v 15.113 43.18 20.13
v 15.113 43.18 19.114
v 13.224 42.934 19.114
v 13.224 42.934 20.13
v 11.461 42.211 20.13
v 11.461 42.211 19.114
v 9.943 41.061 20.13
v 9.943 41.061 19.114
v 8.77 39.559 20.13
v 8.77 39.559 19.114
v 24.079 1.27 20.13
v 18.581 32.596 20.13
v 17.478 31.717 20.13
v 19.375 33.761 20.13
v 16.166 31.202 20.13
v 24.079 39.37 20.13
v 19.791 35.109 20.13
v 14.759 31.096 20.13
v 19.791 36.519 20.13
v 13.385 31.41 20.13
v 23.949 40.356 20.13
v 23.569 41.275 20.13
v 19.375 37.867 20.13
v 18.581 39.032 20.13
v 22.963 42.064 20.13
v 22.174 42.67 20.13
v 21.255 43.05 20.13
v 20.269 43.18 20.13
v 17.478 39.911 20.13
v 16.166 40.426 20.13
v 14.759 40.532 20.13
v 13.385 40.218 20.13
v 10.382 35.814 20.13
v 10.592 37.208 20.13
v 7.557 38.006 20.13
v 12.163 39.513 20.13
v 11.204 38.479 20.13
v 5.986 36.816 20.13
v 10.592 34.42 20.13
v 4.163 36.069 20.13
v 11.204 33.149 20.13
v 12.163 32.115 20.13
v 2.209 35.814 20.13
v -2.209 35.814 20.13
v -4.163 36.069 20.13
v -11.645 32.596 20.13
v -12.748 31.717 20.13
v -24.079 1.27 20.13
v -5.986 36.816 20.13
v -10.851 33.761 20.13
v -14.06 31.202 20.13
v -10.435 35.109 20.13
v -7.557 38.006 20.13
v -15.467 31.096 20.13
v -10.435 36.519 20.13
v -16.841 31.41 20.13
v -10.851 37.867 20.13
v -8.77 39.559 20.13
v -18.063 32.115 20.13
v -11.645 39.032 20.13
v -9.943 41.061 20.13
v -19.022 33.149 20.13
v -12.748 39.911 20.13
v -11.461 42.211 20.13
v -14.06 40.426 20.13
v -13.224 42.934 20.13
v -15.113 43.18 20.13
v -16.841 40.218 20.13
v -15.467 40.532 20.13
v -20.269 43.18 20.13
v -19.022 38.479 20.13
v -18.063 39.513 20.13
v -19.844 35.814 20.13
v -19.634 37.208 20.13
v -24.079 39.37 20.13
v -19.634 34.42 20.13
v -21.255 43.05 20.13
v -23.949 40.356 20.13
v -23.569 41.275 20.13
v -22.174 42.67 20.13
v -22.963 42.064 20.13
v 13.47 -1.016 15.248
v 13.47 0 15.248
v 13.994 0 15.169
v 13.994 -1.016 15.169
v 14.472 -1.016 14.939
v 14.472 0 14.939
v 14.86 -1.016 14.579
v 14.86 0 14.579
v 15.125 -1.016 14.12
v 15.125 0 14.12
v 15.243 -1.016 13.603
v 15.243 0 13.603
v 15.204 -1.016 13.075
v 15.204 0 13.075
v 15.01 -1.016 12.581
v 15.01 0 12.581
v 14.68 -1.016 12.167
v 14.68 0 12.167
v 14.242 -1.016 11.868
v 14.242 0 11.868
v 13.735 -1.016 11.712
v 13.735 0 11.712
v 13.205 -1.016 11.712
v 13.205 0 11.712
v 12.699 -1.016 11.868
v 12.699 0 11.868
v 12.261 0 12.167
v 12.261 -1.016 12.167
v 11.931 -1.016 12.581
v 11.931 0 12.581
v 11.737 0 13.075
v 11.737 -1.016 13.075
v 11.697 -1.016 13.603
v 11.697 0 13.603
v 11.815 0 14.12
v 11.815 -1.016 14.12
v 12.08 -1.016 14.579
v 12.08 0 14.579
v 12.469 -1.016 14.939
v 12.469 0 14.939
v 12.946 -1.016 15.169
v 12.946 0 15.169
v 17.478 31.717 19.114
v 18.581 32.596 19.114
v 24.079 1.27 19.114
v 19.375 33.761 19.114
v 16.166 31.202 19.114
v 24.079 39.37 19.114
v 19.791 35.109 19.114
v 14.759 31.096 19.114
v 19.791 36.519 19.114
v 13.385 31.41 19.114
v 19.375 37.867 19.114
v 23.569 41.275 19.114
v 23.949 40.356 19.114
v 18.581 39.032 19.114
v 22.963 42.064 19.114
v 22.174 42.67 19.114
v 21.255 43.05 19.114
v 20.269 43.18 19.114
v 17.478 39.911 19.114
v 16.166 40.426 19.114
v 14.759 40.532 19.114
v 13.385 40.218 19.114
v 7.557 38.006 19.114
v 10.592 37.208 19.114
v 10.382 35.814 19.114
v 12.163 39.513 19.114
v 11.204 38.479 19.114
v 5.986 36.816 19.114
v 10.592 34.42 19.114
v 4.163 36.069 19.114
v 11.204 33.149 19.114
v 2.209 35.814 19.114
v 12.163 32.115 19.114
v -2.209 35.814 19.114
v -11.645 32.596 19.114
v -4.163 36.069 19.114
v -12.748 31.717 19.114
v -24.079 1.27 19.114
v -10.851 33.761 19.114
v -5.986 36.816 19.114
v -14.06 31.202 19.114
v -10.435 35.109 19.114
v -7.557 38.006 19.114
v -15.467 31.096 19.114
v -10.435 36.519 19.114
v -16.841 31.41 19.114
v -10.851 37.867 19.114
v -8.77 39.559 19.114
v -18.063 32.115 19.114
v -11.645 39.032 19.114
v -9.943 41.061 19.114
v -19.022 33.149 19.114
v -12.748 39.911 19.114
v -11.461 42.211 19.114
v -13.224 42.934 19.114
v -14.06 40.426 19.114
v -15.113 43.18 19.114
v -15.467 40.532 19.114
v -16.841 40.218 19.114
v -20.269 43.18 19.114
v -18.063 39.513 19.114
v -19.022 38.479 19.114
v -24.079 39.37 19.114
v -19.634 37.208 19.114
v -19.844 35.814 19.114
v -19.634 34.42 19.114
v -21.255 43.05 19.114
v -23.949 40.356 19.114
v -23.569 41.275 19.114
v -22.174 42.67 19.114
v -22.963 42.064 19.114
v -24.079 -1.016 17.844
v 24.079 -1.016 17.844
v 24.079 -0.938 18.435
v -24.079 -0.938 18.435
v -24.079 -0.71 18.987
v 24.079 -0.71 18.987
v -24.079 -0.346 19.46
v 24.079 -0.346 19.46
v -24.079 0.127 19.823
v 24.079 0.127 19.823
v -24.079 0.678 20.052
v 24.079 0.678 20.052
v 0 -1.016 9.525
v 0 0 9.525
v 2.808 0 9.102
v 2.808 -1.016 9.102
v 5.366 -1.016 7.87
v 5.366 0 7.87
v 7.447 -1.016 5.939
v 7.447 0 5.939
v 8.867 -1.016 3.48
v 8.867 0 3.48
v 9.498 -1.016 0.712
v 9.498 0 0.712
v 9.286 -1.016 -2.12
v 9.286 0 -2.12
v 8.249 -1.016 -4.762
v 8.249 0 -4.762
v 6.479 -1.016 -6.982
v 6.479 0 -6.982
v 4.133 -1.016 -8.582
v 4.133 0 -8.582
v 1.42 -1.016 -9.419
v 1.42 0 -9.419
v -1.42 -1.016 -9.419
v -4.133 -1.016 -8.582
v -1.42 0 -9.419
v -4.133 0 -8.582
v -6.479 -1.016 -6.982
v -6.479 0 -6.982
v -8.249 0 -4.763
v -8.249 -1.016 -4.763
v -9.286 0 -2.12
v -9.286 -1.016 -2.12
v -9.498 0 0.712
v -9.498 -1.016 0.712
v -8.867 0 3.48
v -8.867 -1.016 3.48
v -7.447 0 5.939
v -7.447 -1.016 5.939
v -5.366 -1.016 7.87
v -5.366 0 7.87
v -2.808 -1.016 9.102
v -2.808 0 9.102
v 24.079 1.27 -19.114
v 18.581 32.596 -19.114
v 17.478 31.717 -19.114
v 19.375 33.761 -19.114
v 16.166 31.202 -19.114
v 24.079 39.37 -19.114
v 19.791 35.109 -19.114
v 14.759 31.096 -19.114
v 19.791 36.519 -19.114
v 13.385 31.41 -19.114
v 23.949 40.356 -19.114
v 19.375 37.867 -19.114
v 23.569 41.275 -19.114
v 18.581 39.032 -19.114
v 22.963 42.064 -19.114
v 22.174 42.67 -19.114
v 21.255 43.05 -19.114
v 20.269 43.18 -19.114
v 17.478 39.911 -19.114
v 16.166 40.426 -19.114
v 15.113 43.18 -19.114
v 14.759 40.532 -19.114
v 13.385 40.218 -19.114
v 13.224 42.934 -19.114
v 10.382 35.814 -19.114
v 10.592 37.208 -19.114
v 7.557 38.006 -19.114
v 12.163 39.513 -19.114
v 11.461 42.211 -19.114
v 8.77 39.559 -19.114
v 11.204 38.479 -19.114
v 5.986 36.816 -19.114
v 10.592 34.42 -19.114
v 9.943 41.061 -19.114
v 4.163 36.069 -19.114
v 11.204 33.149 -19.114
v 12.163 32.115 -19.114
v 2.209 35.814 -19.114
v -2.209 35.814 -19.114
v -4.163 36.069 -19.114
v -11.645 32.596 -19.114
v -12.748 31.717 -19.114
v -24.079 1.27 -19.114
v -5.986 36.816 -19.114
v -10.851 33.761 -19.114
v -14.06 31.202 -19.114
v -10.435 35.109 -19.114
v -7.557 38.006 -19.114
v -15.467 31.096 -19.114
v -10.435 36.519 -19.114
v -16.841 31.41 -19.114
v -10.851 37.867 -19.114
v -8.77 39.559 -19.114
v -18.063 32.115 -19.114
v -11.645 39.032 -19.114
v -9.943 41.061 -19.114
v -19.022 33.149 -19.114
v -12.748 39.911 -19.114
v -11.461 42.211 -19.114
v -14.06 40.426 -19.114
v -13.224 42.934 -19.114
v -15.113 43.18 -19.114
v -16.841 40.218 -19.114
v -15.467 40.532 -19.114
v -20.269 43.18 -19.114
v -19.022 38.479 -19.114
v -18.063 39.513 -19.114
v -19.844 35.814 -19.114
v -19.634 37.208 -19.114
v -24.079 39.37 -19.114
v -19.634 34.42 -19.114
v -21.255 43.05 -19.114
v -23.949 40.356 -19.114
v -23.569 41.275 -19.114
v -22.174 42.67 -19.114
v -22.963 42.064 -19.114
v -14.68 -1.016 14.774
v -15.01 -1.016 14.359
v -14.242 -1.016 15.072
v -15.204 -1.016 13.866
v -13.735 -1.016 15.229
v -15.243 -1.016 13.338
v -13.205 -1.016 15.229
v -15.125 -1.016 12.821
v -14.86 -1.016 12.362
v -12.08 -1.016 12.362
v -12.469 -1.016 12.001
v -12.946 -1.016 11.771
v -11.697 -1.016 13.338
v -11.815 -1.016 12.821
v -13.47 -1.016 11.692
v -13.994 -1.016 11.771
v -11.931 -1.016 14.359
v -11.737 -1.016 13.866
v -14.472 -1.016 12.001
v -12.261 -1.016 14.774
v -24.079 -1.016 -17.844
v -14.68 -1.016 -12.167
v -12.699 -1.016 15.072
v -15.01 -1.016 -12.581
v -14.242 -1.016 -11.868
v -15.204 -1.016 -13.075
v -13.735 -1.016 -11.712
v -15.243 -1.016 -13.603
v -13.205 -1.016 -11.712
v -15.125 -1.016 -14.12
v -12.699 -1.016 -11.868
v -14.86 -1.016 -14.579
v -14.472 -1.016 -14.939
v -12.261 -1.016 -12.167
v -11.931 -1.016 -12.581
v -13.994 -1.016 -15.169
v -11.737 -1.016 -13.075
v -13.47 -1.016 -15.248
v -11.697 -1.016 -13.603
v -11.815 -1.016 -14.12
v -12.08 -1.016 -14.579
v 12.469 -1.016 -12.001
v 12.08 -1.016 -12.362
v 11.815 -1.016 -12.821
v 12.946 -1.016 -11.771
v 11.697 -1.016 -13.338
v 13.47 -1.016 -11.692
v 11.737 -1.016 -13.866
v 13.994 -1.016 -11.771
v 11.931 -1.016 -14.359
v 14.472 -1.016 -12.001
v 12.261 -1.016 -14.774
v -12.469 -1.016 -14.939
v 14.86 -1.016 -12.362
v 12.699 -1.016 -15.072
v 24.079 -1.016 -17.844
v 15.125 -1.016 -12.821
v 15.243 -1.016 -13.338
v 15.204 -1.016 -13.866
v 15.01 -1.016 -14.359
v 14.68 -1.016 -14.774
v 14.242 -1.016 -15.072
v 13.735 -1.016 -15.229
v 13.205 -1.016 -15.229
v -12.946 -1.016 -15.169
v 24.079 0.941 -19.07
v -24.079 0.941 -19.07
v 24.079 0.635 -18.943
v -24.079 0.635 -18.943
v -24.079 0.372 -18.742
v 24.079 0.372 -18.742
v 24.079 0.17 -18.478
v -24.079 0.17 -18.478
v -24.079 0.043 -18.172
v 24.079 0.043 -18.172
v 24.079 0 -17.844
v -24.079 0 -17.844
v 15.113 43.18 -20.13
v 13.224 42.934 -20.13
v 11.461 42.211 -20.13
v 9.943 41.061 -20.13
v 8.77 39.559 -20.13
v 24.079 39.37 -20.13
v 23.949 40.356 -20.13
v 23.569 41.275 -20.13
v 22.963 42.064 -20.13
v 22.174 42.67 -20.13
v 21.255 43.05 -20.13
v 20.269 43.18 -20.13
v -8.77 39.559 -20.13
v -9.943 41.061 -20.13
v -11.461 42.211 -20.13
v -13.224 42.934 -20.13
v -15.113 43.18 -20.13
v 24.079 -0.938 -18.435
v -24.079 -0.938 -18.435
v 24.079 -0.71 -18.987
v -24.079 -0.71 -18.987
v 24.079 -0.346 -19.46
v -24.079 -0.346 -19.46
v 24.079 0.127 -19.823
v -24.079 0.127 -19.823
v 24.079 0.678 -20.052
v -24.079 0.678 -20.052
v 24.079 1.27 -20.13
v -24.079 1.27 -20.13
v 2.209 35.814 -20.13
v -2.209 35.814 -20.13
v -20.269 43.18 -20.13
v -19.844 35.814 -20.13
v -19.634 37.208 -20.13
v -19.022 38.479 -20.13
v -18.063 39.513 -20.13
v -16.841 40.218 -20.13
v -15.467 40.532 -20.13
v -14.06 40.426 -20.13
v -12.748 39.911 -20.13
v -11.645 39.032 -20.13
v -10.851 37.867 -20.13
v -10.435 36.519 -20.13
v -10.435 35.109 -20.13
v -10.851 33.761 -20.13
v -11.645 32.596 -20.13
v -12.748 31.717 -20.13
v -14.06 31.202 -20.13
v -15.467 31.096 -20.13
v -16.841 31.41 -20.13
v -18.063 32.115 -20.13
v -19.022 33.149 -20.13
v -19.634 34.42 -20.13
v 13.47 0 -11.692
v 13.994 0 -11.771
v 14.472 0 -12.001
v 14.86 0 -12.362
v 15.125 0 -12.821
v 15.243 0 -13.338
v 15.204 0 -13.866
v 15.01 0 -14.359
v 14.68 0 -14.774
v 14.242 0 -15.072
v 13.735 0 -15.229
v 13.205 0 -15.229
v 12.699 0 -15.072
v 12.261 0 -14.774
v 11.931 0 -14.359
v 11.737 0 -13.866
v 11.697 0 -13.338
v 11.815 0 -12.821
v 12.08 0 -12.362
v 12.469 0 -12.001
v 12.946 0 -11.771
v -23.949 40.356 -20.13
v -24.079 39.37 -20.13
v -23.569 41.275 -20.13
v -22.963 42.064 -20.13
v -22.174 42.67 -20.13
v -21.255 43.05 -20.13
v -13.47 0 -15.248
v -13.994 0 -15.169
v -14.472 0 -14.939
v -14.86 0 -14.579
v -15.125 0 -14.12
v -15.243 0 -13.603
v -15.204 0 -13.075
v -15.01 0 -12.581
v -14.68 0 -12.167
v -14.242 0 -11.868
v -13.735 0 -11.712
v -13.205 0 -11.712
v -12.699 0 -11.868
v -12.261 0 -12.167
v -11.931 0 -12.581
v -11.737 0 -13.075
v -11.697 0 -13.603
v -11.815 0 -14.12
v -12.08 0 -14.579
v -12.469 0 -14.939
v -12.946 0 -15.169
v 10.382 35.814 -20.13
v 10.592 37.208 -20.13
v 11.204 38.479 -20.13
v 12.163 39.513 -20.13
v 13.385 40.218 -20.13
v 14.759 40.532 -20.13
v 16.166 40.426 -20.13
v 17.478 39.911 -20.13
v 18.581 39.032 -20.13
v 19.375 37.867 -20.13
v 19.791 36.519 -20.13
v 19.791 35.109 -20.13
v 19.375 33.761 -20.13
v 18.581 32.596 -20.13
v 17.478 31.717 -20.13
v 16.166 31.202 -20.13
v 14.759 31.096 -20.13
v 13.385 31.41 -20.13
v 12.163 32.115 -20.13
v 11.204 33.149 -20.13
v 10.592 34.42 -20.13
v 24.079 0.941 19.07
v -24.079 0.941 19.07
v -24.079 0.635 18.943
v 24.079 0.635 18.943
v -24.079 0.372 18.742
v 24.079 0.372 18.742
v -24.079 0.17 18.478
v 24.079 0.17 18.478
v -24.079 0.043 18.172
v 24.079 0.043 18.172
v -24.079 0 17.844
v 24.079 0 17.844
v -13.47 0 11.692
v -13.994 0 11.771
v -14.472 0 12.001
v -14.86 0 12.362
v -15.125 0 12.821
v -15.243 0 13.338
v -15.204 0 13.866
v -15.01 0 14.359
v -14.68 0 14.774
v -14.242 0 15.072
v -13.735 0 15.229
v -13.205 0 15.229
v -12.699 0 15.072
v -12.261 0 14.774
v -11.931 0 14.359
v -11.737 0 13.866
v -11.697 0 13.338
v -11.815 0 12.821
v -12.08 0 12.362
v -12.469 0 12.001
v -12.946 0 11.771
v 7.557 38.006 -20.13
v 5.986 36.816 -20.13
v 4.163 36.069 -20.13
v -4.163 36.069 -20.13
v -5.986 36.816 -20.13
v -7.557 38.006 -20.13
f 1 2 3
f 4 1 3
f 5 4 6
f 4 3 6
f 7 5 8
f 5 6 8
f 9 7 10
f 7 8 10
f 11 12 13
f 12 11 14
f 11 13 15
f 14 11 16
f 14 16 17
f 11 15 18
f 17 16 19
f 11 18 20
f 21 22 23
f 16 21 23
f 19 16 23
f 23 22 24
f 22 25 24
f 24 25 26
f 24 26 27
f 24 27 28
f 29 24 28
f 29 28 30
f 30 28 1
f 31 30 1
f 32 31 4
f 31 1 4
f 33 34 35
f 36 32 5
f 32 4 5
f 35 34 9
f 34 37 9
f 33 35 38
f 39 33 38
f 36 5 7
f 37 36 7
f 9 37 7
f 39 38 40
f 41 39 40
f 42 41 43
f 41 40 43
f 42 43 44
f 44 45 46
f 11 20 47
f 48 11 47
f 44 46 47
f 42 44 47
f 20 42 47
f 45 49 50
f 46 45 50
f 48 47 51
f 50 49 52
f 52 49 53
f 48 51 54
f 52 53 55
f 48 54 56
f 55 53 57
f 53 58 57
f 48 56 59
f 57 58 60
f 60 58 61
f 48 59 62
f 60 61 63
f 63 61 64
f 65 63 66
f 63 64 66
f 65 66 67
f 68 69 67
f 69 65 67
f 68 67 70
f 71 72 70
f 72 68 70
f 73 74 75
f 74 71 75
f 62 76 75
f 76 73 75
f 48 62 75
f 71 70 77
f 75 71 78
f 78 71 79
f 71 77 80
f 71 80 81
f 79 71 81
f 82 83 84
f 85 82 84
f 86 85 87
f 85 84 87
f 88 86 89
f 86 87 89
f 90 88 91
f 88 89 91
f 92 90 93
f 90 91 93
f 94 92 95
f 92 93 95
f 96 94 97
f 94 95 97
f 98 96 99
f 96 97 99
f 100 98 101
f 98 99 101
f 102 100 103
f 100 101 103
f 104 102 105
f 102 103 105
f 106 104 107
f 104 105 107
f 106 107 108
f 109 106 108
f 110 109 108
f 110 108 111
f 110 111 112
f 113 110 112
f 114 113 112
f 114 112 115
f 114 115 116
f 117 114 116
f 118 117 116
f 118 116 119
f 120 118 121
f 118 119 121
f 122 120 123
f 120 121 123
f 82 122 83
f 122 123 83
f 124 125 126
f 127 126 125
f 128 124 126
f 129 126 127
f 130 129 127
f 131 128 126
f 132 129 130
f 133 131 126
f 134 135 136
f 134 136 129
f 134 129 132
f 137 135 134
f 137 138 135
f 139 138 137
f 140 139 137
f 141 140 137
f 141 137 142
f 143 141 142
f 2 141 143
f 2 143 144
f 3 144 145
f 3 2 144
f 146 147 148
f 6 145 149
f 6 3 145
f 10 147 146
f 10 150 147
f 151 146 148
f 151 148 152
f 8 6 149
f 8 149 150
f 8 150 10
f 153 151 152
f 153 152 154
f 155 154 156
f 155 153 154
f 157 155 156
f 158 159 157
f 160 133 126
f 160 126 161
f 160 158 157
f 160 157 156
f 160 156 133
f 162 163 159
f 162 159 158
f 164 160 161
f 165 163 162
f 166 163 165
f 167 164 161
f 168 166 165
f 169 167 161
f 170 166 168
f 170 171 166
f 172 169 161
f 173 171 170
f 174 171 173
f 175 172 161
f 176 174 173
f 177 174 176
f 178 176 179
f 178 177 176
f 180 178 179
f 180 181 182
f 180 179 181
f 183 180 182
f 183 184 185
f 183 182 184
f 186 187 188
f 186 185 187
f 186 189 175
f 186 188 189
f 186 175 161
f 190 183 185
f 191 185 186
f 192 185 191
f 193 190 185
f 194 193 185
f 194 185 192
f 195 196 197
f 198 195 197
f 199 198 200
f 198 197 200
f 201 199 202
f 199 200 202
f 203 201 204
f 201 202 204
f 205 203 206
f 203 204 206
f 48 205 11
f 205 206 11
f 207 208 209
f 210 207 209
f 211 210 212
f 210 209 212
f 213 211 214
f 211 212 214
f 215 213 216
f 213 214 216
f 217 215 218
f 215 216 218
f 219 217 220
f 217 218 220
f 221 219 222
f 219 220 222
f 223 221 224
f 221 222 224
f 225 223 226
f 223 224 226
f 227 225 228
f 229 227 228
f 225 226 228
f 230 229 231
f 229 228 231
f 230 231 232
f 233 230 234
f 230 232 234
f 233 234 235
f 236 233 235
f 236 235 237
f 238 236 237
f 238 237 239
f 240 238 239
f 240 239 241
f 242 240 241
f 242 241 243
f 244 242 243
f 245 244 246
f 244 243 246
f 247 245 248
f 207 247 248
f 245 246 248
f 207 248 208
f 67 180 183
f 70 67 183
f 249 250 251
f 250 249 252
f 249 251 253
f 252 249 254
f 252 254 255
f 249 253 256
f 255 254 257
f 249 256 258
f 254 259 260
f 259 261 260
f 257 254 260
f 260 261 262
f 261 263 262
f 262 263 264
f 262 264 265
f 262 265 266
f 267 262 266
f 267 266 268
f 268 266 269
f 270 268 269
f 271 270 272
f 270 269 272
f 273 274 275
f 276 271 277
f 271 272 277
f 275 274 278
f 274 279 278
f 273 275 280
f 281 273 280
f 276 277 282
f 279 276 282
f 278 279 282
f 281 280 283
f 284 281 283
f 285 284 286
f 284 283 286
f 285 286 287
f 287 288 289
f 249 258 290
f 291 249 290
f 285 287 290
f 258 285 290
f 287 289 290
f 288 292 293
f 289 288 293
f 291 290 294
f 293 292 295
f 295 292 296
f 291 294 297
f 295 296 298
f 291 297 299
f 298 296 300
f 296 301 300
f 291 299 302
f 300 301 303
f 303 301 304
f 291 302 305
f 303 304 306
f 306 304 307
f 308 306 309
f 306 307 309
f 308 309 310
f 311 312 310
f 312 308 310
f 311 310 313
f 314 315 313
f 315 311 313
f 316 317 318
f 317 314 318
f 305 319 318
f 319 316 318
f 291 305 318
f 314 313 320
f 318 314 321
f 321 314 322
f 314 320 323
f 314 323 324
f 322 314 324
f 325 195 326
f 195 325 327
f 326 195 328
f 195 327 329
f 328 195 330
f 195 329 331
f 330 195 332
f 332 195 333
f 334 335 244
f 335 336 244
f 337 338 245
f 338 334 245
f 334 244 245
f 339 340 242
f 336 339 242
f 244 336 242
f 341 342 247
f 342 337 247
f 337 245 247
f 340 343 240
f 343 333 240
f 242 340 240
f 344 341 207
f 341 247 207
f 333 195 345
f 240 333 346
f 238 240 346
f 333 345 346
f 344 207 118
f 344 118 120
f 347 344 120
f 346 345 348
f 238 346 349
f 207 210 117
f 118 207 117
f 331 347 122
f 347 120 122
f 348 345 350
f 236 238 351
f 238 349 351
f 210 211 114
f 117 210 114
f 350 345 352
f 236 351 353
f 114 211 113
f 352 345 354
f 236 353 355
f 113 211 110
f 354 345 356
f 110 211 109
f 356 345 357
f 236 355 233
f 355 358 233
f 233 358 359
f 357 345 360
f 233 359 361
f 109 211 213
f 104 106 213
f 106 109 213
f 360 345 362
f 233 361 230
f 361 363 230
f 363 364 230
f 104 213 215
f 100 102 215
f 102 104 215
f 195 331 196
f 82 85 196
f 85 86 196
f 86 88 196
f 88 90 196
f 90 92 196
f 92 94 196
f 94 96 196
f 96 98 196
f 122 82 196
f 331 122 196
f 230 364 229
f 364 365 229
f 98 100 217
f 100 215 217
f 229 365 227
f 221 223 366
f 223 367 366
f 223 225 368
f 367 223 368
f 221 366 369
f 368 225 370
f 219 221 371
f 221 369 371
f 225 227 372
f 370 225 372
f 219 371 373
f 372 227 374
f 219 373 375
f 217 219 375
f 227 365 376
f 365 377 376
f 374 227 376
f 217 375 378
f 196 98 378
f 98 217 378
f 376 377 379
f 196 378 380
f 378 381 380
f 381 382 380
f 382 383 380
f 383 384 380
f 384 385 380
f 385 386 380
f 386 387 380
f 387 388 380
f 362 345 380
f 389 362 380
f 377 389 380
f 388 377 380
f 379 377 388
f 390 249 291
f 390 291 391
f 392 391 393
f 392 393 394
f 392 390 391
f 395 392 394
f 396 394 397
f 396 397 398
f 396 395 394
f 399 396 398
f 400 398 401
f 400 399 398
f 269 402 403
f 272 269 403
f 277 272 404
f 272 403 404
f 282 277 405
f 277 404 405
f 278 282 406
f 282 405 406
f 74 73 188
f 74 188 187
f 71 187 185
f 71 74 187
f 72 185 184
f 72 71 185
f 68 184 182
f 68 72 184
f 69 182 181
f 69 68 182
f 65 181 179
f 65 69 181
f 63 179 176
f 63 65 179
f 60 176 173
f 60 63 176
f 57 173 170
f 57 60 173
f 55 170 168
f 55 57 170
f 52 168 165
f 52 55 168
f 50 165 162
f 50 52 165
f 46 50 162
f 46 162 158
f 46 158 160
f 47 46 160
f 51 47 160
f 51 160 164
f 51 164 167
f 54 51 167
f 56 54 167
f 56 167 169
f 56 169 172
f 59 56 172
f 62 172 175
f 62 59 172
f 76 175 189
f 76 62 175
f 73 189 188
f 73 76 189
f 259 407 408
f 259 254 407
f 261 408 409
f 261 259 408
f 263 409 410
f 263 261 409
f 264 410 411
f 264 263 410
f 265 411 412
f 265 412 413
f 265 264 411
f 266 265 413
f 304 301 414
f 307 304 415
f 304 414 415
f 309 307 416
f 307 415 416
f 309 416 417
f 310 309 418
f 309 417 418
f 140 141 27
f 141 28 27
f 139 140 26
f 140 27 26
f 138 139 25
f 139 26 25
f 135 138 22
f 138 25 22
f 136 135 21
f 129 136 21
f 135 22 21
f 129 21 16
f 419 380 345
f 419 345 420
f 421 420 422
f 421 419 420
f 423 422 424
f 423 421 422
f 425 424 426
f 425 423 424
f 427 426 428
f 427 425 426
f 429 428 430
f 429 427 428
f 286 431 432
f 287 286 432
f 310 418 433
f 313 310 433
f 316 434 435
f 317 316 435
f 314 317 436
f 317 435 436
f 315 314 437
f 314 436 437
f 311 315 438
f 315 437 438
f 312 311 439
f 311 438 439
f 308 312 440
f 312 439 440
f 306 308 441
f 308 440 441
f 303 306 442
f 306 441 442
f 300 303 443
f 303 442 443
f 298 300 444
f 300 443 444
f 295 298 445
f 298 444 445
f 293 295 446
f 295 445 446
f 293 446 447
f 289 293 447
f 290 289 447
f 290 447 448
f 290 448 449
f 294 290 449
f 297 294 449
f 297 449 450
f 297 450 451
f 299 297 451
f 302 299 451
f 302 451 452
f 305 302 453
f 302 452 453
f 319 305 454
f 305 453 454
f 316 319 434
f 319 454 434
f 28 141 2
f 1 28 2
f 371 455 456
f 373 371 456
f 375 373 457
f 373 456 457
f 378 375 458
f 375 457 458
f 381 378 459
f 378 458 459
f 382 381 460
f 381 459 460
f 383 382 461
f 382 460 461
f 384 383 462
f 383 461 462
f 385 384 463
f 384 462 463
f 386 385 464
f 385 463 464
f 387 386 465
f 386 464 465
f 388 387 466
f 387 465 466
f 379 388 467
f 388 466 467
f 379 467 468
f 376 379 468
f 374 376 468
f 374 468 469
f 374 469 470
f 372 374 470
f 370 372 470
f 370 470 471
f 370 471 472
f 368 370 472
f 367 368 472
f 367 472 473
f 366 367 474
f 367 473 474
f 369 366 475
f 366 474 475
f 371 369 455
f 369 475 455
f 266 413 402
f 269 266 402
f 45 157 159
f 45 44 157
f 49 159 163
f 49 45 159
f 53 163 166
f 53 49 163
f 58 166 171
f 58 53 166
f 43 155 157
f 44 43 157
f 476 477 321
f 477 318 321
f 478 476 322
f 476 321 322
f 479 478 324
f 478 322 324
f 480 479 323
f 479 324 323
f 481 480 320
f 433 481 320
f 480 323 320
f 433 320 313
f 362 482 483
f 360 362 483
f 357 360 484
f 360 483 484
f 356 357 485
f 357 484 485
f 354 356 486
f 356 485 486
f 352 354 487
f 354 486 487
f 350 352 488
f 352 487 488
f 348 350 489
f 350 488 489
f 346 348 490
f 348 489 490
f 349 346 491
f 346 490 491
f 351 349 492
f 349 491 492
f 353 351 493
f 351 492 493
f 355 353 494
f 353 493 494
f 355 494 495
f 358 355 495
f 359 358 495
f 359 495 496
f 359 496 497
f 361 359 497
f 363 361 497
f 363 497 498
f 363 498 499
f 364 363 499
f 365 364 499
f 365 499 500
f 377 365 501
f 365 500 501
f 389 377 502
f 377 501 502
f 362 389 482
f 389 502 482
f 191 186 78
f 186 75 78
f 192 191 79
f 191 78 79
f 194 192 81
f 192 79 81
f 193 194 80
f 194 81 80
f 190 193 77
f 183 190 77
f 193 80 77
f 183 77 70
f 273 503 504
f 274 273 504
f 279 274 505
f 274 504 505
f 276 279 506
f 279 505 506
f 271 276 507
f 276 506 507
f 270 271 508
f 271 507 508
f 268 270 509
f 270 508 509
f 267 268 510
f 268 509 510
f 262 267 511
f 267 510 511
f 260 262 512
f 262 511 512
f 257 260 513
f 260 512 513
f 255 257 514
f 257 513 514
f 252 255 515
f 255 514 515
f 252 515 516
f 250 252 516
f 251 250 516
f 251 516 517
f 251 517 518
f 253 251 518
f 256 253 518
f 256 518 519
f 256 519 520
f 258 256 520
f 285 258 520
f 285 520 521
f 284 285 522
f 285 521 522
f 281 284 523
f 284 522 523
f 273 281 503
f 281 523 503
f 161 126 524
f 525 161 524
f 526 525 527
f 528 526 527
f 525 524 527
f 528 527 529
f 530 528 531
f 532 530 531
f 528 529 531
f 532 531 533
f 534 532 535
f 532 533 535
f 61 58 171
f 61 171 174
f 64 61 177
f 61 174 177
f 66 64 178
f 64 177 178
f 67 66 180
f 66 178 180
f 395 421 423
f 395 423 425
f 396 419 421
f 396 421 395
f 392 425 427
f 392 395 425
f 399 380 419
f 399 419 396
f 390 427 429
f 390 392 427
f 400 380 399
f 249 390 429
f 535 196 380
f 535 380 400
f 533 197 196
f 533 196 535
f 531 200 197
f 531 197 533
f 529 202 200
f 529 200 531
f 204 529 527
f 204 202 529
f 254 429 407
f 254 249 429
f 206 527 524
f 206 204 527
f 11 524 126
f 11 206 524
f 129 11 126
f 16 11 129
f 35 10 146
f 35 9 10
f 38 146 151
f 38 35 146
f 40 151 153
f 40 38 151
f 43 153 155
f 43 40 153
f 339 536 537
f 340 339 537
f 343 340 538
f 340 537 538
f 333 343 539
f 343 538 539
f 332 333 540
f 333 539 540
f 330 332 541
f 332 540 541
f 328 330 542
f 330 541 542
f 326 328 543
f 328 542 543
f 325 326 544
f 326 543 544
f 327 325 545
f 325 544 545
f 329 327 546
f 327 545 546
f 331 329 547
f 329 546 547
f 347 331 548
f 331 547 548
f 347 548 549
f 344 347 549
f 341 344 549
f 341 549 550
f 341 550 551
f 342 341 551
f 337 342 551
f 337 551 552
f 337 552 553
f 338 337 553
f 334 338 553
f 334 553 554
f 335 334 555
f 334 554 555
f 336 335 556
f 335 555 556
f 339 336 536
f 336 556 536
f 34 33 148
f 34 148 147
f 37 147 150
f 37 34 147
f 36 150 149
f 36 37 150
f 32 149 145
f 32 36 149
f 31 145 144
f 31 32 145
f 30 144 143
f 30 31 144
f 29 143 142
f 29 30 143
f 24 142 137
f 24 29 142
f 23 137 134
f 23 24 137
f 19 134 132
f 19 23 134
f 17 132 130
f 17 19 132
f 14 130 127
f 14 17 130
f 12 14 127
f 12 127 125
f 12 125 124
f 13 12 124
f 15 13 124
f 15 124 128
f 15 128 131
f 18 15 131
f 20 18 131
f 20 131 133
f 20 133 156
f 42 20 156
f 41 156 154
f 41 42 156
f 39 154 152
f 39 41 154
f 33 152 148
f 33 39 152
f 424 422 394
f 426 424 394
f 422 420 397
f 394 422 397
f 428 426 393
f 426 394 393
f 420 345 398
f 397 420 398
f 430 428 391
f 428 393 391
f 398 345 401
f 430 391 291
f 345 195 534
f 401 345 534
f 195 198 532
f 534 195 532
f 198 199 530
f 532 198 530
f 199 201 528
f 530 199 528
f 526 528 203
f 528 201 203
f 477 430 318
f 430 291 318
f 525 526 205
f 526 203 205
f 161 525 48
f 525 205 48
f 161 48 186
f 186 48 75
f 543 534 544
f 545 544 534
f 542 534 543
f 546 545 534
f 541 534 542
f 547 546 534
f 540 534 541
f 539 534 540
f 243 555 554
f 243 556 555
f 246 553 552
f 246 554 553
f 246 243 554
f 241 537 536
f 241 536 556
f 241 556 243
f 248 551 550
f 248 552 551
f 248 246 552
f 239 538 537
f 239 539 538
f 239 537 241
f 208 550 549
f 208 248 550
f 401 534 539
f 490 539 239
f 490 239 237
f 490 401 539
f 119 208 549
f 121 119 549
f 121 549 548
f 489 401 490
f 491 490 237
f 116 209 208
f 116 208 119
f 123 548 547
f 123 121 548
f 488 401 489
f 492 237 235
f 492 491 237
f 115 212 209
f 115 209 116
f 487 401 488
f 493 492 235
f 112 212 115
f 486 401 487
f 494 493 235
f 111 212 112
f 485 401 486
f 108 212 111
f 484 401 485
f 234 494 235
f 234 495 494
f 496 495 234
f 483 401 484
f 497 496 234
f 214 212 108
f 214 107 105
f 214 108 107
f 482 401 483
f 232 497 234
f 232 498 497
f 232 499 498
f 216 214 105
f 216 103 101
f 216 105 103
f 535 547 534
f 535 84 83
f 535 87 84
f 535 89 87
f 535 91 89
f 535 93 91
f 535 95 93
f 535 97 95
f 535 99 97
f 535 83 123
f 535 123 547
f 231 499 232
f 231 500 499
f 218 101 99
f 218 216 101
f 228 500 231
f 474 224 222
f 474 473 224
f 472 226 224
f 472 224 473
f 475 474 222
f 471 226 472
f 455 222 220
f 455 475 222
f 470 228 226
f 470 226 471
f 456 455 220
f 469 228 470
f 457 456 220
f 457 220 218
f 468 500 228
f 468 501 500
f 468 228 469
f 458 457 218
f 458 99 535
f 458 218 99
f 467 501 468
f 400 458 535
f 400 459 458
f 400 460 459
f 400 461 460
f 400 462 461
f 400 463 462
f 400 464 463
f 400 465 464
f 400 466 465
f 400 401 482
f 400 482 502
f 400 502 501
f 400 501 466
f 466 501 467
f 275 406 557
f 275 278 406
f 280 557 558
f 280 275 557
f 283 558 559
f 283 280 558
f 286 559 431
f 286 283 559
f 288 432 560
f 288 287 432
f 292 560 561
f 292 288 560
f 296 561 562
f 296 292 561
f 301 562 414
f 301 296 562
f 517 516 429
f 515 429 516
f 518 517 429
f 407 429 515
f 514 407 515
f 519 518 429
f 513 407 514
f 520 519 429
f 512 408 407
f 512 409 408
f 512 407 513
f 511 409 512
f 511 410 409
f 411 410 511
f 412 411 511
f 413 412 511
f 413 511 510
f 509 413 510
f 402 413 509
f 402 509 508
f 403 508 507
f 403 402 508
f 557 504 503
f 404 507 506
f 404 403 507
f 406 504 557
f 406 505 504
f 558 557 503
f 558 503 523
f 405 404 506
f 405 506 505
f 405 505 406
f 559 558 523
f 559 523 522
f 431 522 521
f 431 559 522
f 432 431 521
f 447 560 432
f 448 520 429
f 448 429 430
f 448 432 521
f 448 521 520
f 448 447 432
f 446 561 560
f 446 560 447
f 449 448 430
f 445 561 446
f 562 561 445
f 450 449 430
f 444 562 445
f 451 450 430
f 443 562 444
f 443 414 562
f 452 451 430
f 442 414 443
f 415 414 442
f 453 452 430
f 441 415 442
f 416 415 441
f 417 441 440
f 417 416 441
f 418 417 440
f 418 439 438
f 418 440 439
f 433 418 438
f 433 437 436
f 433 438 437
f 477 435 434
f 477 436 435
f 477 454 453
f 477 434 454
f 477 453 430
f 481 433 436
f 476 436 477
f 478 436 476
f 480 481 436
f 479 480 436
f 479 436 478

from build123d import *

# Parameters (mm, degrees)
SKETCH1_W                    = 48.1584
SKETCH1_H                    = 38.227
SKETCH1_R                    = 9.525
SKETCH1_R_2                  = 1.778
BASE_FLANGE1_DEPTH           = 1.016
EDGE_FLANGE1_STRIP_W         = 6.604
EDGE_FLANGE1_STRIP_H         = 1.016
EDGE_FLANGE1_STRIP_CUT_DEPTH = 48.1584
EDGE_FLANGE1_DEPTH           = 48.1584
EDGE_FLANGE1_START           = 1.016
EDGE_FLANGE1_PROFILE_W       = 48.1584
EDGE_FLANGE1_PROFILE_H       = 43.5102
EDGE_FLANGE1_PROFILE_R       = 4.73075
EDGE_FLANGE1_FLAT_DEPTH      = 1.016
CUT_EXTRUDE7_DEPTH           = 65.852611865
FILLET2_R                    = 7.62
FILLET3_R                    = 3.81


# Sheet-metal steps are written as plain solids
with BuildPart() as part:
    # Sketch1 → Base-Flange1 (new body)
    with BuildSketch(Plane(origin=(0, 0, 0), x_dir=(1, 0, 0), z_dir=(0, 1, 0))):
        Rectangle(SKETCH1_W, SKETCH1_H)
        with Locations(Location((0, 0, 0), (0, 0, 270))):
            Circle(SKETCH1_R, mode=Mode.SUBTRACT)
        with Locations(Location((13.470384182, -13.470384182, 0), (0, 0, 270))):
            Circle(SKETCH1_R_2, mode=Mode.SUBTRACT)
        with Locations(Location((13.470384182, 13.470384182, 0), (0, 0, 270))):
            Circle(SKETCH1_R_2, mode=Mode.SUBTRACT)
        with Locations(Location((-13.470384182, 13.470384182, 0), (0, 0, 90))):
            Circle(SKETCH1_R_2, mode=Mode.SUBTRACT)
        with Locations(Location((-13.470384182, -13.470384182, 0), (0, 0, 90))):
            Circle(SKETCH1_R_2, mode=Mode.SUBTRACT)
    extrude(amount=-BASE_FLANGE1_DEPTH)

    # Edge-Flange1 strip (across the edge) → Edge-Flange1 strip cut (cut)
    with BuildSketch(Plane(origin=(24.0792, 0, -19.1135), x_dir=(0, 0, 1), z_dir=(-1, 0, 0))):
        with Locations((-2.032, -0.508)):
            Rectangle(EDGE_FLANGE1_STRIP_W, EDGE_FLANGE1_STRIP_H)
    edge_flange1_strip_cut = extrude(amount=EDGE_FLANGE1_STRIP_CUT_DEPTH, mode=Mode.SUBTRACT)

    # Edge-Flange1 bend section (across the edge) → Edge-Flange1 (add)
    with BuildSketch(Plane(origin=(24.0792, 0, -19.1135), x_dir=(0, 0, 1), z_dir=(-1, 0, 0))):
        with BuildLine():
            Line((-1.016, 1.27), (0, 1.27))
            ThreePointArc((0, 1.27), (0.371974388, 0.371974388), (1.27, 0))
            Line((1.27, 0), (1.27, -1.016))
            ThreePointArc((1.27, -1.016), (-0.346446102, -0.346446102), (-1.016, 1.27))
        make_face()
    edge_flange1 = extrude(amount=EDGE_FLANGE1_DEPTH)

    # Edge-Flange1 profile (on flange) → Edge-Flange1 flat (add)
    with BuildSketch(Plane(origin=(0, 0, -19.1135), x_dir=(-1, 0, 0), z_dir=(0, 0, -1)).offset(EDGE_FLANGE1_START)):
        with Locations((0, 23.0251)):
            Rectangle(EDGE_FLANGE1_PROFILE_W, EDGE_FLANGE1_PROFILE_H)
        with Locations((-15.113, 35.814)):
            Circle(EDGE_FLANGE1_PROFILE_R, mode=Mode.SUBTRACT)
        with Locations((15.113, 35.814)):
            Circle(EDGE_FLANGE1_PROFILE_R, mode=Mode.SUBTRACT)
    edge_flange1_flat = extrude(amount=-EDGE_FLANGE1_FLAT_DEPTH)

    # Mirror1: Edge-Flange1 strip cut, Edge-Flange1, Edge-Flange1 flat across plane
    add(edge_flange1_strip_cut.mirror(Plane.XY), mode=Mode.SUBTRACT)
    add(edge_flange1.mirror(Plane.XY))
    add(edge_flange1_flat.mirror(Plane.XY))

    # Sketch11 → Cut-Extrude7 (cut, through all)
    with BuildSketch(Plane(origin=(0, 0, -20.1295), x_dir=(-1, 0, 0), z_dir=(0, 0, -1))):
        with BuildLine():
            Line((24.0792, 43.18), (24.0792, 44.7802))
            Line((24.0792, 44.7802), (-24.0792, 44.7802))
            Line((-24.0792, 44.7802), (-24.0792, 43.18))
            Line((-24.0792, 43.18), (-15.113, 43.18))
            ThreePointArc((-15.113, 43.18), (-9.90445145, 41.02254855), (-7.747, 35.814))
            Line((-7.747, 35.814), (7.747, 35.814))
            ThreePointArc((7.747, 35.814), (9.90445145, 41.02254855), (15.113, 43.18))
            Line((15.113, 43.18), (24.0792, 43.18))
        make_face()
    extrude(amount=-CUT_EXTRUDE7_DEPTH, mode=Mode.SUBTRACT)

    # Fillet2
    fillet2_edges = [part.edges().sort_by_distance(p)[0] for p in [
        (7.747, 35.814, -19.6215),
        (-7.747, 35.814, -19.6215),
        (7.747, 35.814, 19.6215),
        (-7.747, 35.814, 19.6215),
    ]]
    fillet(fillet2_edges, radius=FILLET2_R)

    # Fillet3
    fillet3_edges = [part.edges().sort_by_distance(p)[0] for p in [
        (-24.0792, 43.18, -19.6215),
        (24.0792, 43.18, -19.6215),
        (24.0792, 43.18, 19.6215),
        (-24.0792, 43.18, 19.6215),
    ]]
    fillet(fillet3_edges, radius=FILLET3_R)


solid = part.part
